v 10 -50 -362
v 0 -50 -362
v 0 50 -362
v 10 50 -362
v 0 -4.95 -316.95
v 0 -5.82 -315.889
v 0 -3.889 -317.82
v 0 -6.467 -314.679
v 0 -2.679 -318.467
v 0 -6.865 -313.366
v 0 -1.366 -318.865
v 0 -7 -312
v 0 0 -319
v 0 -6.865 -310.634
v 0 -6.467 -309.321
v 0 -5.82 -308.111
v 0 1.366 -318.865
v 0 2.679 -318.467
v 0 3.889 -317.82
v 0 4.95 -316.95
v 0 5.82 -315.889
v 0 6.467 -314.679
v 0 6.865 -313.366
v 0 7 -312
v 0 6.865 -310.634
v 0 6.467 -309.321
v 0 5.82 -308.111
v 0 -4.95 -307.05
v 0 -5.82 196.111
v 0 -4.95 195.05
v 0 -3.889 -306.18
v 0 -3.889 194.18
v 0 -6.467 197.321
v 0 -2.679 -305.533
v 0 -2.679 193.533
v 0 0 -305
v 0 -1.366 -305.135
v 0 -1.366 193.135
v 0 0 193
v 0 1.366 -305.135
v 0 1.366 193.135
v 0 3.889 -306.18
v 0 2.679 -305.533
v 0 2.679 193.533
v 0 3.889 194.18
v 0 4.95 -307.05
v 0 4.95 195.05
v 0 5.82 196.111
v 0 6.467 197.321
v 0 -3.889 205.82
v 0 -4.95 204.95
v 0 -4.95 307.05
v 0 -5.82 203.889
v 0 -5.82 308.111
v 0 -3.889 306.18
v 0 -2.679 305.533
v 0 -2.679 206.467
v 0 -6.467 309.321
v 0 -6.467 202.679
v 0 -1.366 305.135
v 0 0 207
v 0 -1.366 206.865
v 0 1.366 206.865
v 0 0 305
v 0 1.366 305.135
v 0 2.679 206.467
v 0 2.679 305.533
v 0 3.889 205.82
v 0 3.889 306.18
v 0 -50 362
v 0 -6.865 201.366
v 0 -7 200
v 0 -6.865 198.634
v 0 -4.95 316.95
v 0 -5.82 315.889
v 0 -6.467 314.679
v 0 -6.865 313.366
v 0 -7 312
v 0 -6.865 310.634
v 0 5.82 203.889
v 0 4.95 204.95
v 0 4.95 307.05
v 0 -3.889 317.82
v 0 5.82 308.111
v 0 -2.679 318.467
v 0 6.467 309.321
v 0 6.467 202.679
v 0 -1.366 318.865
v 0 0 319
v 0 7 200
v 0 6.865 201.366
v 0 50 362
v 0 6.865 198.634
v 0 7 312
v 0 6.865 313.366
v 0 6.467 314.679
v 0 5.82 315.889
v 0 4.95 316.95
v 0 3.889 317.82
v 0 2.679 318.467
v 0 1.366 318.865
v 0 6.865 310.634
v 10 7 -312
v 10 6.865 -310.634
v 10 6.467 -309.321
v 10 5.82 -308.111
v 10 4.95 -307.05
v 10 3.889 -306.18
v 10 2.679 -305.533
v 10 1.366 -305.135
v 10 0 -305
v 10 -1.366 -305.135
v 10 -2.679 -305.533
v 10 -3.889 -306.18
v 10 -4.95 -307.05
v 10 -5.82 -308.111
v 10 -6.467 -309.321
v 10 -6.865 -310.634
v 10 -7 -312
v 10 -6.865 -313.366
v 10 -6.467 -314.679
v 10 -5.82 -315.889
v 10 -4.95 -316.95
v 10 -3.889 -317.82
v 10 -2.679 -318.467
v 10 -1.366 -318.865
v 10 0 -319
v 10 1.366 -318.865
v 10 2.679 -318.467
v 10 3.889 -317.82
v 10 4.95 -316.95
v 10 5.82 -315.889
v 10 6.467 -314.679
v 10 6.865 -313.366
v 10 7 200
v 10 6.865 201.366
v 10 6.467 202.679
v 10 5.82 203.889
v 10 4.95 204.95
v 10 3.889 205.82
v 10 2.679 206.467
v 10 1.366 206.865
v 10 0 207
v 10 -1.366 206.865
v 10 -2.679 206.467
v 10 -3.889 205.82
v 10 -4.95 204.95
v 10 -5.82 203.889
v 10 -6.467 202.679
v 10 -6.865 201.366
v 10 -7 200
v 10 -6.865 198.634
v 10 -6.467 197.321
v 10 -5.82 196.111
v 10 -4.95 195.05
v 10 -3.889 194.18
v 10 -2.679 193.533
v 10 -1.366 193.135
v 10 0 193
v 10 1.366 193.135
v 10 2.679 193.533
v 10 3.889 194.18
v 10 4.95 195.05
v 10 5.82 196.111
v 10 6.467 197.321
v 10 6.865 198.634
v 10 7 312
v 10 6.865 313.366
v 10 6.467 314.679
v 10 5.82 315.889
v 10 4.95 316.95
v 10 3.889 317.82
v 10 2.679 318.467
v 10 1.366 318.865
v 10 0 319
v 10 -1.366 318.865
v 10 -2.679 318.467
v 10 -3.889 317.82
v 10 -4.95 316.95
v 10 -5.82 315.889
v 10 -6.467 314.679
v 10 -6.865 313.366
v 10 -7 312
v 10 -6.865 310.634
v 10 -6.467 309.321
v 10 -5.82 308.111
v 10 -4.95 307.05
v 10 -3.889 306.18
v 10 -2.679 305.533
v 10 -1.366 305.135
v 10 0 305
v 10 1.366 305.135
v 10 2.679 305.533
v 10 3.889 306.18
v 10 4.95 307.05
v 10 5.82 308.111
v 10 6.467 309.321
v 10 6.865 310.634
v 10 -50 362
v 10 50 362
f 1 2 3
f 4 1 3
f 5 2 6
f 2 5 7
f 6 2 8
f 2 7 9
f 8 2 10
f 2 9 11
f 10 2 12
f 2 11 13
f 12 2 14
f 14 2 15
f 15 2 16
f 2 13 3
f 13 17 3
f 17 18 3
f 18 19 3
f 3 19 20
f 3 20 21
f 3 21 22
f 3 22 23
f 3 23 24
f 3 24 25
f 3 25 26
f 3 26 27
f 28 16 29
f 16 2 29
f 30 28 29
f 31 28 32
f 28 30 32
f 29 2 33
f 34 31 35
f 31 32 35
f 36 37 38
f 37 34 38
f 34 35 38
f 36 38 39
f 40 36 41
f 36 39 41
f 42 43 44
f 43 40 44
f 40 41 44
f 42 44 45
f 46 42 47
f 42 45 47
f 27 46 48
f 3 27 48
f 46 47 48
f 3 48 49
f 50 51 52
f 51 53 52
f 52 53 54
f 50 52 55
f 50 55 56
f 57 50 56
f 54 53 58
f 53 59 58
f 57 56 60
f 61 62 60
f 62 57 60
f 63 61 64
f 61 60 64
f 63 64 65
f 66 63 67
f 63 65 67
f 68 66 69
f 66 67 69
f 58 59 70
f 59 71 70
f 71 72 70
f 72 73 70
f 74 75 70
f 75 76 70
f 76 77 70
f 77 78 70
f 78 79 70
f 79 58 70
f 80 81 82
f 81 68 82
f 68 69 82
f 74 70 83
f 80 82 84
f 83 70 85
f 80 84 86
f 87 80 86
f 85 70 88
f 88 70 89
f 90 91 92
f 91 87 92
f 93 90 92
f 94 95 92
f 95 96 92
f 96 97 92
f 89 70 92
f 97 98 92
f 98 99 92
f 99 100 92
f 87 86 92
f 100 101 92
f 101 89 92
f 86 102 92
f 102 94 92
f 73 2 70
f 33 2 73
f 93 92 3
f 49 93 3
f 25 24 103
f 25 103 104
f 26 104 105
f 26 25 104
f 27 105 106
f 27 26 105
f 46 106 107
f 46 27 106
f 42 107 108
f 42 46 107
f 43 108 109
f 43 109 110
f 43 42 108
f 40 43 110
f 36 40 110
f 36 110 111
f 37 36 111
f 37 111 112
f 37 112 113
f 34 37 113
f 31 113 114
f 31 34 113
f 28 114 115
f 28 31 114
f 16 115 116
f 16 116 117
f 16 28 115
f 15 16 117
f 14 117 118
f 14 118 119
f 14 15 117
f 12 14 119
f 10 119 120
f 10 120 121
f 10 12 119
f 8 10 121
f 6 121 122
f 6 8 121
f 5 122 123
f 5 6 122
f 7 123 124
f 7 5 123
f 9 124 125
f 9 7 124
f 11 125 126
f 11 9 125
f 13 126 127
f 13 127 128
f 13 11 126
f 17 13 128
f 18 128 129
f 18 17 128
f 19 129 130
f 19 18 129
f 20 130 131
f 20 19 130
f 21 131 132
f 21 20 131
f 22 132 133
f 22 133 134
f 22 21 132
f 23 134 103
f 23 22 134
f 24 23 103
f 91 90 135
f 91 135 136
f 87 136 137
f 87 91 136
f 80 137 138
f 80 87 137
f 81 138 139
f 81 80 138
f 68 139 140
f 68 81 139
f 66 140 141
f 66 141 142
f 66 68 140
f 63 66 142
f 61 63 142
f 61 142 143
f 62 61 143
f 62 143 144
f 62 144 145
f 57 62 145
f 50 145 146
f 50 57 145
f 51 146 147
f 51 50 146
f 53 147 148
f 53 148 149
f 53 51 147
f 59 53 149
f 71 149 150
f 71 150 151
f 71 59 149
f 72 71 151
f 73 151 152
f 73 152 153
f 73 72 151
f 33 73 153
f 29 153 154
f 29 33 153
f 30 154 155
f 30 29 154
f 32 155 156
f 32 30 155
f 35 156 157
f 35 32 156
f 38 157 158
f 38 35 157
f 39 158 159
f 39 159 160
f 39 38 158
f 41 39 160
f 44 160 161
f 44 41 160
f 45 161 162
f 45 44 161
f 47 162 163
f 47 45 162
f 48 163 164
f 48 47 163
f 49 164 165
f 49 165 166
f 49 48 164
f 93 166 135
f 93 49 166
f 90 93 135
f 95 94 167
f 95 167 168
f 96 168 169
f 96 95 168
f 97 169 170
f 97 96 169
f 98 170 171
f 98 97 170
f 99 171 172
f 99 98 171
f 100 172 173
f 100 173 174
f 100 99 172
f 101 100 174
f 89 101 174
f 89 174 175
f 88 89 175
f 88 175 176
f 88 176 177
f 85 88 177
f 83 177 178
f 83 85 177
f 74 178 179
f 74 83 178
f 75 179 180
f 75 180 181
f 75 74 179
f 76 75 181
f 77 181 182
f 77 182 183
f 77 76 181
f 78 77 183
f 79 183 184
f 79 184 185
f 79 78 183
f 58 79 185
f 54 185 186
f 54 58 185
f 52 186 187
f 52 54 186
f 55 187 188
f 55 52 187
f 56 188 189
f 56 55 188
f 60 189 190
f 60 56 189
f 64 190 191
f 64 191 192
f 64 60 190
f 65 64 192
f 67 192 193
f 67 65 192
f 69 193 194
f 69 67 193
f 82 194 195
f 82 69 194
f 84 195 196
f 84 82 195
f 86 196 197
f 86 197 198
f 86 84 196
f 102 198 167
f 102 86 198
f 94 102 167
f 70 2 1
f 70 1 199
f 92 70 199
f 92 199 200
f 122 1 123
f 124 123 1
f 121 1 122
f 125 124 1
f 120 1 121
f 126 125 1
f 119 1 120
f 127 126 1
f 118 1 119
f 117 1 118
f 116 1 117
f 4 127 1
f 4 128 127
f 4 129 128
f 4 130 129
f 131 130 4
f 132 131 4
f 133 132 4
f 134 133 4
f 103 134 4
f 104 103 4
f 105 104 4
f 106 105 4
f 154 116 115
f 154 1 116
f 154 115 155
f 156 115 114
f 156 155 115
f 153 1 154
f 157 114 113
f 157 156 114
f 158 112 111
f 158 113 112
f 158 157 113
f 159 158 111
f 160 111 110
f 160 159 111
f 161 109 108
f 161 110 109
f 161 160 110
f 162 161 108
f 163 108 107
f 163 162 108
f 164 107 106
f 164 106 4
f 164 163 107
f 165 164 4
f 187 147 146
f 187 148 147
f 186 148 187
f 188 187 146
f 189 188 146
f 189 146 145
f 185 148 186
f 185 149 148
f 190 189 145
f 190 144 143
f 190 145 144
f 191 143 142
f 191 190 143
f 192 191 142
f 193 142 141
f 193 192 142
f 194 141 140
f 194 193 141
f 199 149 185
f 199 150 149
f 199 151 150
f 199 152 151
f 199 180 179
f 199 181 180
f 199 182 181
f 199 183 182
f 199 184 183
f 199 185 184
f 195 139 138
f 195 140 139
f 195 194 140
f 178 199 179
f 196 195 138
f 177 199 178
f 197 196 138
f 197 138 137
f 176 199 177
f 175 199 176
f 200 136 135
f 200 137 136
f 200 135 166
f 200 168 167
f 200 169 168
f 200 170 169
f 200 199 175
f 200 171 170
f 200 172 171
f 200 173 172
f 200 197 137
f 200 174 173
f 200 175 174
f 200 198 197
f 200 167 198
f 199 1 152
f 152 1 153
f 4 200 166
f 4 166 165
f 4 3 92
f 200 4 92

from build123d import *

# Parameters (mm, degrees)
F0_W     = 100
F0_H     = 724
F0_R     = 7
F1_DEPTH = 10


with BuildPart() as f1:
    # F0 (on Right) → F1 (new body)
    with BuildSketch(Plane.YZ):
        Rectangle(F0_W, F0_H)
        with Locations((0, -312)):
            Circle(F0_R, mode=Mode.SUBTRACT)
        with Locations((0, 200)):
            Circle(F0_R, mode=Mode.SUBTRACT)
        with Locations((0, 312)):
            Circle(F0_R, mode=Mode.SUBTRACT)
    extrude(amount=F1_DEPTH)


solid = f1.part
